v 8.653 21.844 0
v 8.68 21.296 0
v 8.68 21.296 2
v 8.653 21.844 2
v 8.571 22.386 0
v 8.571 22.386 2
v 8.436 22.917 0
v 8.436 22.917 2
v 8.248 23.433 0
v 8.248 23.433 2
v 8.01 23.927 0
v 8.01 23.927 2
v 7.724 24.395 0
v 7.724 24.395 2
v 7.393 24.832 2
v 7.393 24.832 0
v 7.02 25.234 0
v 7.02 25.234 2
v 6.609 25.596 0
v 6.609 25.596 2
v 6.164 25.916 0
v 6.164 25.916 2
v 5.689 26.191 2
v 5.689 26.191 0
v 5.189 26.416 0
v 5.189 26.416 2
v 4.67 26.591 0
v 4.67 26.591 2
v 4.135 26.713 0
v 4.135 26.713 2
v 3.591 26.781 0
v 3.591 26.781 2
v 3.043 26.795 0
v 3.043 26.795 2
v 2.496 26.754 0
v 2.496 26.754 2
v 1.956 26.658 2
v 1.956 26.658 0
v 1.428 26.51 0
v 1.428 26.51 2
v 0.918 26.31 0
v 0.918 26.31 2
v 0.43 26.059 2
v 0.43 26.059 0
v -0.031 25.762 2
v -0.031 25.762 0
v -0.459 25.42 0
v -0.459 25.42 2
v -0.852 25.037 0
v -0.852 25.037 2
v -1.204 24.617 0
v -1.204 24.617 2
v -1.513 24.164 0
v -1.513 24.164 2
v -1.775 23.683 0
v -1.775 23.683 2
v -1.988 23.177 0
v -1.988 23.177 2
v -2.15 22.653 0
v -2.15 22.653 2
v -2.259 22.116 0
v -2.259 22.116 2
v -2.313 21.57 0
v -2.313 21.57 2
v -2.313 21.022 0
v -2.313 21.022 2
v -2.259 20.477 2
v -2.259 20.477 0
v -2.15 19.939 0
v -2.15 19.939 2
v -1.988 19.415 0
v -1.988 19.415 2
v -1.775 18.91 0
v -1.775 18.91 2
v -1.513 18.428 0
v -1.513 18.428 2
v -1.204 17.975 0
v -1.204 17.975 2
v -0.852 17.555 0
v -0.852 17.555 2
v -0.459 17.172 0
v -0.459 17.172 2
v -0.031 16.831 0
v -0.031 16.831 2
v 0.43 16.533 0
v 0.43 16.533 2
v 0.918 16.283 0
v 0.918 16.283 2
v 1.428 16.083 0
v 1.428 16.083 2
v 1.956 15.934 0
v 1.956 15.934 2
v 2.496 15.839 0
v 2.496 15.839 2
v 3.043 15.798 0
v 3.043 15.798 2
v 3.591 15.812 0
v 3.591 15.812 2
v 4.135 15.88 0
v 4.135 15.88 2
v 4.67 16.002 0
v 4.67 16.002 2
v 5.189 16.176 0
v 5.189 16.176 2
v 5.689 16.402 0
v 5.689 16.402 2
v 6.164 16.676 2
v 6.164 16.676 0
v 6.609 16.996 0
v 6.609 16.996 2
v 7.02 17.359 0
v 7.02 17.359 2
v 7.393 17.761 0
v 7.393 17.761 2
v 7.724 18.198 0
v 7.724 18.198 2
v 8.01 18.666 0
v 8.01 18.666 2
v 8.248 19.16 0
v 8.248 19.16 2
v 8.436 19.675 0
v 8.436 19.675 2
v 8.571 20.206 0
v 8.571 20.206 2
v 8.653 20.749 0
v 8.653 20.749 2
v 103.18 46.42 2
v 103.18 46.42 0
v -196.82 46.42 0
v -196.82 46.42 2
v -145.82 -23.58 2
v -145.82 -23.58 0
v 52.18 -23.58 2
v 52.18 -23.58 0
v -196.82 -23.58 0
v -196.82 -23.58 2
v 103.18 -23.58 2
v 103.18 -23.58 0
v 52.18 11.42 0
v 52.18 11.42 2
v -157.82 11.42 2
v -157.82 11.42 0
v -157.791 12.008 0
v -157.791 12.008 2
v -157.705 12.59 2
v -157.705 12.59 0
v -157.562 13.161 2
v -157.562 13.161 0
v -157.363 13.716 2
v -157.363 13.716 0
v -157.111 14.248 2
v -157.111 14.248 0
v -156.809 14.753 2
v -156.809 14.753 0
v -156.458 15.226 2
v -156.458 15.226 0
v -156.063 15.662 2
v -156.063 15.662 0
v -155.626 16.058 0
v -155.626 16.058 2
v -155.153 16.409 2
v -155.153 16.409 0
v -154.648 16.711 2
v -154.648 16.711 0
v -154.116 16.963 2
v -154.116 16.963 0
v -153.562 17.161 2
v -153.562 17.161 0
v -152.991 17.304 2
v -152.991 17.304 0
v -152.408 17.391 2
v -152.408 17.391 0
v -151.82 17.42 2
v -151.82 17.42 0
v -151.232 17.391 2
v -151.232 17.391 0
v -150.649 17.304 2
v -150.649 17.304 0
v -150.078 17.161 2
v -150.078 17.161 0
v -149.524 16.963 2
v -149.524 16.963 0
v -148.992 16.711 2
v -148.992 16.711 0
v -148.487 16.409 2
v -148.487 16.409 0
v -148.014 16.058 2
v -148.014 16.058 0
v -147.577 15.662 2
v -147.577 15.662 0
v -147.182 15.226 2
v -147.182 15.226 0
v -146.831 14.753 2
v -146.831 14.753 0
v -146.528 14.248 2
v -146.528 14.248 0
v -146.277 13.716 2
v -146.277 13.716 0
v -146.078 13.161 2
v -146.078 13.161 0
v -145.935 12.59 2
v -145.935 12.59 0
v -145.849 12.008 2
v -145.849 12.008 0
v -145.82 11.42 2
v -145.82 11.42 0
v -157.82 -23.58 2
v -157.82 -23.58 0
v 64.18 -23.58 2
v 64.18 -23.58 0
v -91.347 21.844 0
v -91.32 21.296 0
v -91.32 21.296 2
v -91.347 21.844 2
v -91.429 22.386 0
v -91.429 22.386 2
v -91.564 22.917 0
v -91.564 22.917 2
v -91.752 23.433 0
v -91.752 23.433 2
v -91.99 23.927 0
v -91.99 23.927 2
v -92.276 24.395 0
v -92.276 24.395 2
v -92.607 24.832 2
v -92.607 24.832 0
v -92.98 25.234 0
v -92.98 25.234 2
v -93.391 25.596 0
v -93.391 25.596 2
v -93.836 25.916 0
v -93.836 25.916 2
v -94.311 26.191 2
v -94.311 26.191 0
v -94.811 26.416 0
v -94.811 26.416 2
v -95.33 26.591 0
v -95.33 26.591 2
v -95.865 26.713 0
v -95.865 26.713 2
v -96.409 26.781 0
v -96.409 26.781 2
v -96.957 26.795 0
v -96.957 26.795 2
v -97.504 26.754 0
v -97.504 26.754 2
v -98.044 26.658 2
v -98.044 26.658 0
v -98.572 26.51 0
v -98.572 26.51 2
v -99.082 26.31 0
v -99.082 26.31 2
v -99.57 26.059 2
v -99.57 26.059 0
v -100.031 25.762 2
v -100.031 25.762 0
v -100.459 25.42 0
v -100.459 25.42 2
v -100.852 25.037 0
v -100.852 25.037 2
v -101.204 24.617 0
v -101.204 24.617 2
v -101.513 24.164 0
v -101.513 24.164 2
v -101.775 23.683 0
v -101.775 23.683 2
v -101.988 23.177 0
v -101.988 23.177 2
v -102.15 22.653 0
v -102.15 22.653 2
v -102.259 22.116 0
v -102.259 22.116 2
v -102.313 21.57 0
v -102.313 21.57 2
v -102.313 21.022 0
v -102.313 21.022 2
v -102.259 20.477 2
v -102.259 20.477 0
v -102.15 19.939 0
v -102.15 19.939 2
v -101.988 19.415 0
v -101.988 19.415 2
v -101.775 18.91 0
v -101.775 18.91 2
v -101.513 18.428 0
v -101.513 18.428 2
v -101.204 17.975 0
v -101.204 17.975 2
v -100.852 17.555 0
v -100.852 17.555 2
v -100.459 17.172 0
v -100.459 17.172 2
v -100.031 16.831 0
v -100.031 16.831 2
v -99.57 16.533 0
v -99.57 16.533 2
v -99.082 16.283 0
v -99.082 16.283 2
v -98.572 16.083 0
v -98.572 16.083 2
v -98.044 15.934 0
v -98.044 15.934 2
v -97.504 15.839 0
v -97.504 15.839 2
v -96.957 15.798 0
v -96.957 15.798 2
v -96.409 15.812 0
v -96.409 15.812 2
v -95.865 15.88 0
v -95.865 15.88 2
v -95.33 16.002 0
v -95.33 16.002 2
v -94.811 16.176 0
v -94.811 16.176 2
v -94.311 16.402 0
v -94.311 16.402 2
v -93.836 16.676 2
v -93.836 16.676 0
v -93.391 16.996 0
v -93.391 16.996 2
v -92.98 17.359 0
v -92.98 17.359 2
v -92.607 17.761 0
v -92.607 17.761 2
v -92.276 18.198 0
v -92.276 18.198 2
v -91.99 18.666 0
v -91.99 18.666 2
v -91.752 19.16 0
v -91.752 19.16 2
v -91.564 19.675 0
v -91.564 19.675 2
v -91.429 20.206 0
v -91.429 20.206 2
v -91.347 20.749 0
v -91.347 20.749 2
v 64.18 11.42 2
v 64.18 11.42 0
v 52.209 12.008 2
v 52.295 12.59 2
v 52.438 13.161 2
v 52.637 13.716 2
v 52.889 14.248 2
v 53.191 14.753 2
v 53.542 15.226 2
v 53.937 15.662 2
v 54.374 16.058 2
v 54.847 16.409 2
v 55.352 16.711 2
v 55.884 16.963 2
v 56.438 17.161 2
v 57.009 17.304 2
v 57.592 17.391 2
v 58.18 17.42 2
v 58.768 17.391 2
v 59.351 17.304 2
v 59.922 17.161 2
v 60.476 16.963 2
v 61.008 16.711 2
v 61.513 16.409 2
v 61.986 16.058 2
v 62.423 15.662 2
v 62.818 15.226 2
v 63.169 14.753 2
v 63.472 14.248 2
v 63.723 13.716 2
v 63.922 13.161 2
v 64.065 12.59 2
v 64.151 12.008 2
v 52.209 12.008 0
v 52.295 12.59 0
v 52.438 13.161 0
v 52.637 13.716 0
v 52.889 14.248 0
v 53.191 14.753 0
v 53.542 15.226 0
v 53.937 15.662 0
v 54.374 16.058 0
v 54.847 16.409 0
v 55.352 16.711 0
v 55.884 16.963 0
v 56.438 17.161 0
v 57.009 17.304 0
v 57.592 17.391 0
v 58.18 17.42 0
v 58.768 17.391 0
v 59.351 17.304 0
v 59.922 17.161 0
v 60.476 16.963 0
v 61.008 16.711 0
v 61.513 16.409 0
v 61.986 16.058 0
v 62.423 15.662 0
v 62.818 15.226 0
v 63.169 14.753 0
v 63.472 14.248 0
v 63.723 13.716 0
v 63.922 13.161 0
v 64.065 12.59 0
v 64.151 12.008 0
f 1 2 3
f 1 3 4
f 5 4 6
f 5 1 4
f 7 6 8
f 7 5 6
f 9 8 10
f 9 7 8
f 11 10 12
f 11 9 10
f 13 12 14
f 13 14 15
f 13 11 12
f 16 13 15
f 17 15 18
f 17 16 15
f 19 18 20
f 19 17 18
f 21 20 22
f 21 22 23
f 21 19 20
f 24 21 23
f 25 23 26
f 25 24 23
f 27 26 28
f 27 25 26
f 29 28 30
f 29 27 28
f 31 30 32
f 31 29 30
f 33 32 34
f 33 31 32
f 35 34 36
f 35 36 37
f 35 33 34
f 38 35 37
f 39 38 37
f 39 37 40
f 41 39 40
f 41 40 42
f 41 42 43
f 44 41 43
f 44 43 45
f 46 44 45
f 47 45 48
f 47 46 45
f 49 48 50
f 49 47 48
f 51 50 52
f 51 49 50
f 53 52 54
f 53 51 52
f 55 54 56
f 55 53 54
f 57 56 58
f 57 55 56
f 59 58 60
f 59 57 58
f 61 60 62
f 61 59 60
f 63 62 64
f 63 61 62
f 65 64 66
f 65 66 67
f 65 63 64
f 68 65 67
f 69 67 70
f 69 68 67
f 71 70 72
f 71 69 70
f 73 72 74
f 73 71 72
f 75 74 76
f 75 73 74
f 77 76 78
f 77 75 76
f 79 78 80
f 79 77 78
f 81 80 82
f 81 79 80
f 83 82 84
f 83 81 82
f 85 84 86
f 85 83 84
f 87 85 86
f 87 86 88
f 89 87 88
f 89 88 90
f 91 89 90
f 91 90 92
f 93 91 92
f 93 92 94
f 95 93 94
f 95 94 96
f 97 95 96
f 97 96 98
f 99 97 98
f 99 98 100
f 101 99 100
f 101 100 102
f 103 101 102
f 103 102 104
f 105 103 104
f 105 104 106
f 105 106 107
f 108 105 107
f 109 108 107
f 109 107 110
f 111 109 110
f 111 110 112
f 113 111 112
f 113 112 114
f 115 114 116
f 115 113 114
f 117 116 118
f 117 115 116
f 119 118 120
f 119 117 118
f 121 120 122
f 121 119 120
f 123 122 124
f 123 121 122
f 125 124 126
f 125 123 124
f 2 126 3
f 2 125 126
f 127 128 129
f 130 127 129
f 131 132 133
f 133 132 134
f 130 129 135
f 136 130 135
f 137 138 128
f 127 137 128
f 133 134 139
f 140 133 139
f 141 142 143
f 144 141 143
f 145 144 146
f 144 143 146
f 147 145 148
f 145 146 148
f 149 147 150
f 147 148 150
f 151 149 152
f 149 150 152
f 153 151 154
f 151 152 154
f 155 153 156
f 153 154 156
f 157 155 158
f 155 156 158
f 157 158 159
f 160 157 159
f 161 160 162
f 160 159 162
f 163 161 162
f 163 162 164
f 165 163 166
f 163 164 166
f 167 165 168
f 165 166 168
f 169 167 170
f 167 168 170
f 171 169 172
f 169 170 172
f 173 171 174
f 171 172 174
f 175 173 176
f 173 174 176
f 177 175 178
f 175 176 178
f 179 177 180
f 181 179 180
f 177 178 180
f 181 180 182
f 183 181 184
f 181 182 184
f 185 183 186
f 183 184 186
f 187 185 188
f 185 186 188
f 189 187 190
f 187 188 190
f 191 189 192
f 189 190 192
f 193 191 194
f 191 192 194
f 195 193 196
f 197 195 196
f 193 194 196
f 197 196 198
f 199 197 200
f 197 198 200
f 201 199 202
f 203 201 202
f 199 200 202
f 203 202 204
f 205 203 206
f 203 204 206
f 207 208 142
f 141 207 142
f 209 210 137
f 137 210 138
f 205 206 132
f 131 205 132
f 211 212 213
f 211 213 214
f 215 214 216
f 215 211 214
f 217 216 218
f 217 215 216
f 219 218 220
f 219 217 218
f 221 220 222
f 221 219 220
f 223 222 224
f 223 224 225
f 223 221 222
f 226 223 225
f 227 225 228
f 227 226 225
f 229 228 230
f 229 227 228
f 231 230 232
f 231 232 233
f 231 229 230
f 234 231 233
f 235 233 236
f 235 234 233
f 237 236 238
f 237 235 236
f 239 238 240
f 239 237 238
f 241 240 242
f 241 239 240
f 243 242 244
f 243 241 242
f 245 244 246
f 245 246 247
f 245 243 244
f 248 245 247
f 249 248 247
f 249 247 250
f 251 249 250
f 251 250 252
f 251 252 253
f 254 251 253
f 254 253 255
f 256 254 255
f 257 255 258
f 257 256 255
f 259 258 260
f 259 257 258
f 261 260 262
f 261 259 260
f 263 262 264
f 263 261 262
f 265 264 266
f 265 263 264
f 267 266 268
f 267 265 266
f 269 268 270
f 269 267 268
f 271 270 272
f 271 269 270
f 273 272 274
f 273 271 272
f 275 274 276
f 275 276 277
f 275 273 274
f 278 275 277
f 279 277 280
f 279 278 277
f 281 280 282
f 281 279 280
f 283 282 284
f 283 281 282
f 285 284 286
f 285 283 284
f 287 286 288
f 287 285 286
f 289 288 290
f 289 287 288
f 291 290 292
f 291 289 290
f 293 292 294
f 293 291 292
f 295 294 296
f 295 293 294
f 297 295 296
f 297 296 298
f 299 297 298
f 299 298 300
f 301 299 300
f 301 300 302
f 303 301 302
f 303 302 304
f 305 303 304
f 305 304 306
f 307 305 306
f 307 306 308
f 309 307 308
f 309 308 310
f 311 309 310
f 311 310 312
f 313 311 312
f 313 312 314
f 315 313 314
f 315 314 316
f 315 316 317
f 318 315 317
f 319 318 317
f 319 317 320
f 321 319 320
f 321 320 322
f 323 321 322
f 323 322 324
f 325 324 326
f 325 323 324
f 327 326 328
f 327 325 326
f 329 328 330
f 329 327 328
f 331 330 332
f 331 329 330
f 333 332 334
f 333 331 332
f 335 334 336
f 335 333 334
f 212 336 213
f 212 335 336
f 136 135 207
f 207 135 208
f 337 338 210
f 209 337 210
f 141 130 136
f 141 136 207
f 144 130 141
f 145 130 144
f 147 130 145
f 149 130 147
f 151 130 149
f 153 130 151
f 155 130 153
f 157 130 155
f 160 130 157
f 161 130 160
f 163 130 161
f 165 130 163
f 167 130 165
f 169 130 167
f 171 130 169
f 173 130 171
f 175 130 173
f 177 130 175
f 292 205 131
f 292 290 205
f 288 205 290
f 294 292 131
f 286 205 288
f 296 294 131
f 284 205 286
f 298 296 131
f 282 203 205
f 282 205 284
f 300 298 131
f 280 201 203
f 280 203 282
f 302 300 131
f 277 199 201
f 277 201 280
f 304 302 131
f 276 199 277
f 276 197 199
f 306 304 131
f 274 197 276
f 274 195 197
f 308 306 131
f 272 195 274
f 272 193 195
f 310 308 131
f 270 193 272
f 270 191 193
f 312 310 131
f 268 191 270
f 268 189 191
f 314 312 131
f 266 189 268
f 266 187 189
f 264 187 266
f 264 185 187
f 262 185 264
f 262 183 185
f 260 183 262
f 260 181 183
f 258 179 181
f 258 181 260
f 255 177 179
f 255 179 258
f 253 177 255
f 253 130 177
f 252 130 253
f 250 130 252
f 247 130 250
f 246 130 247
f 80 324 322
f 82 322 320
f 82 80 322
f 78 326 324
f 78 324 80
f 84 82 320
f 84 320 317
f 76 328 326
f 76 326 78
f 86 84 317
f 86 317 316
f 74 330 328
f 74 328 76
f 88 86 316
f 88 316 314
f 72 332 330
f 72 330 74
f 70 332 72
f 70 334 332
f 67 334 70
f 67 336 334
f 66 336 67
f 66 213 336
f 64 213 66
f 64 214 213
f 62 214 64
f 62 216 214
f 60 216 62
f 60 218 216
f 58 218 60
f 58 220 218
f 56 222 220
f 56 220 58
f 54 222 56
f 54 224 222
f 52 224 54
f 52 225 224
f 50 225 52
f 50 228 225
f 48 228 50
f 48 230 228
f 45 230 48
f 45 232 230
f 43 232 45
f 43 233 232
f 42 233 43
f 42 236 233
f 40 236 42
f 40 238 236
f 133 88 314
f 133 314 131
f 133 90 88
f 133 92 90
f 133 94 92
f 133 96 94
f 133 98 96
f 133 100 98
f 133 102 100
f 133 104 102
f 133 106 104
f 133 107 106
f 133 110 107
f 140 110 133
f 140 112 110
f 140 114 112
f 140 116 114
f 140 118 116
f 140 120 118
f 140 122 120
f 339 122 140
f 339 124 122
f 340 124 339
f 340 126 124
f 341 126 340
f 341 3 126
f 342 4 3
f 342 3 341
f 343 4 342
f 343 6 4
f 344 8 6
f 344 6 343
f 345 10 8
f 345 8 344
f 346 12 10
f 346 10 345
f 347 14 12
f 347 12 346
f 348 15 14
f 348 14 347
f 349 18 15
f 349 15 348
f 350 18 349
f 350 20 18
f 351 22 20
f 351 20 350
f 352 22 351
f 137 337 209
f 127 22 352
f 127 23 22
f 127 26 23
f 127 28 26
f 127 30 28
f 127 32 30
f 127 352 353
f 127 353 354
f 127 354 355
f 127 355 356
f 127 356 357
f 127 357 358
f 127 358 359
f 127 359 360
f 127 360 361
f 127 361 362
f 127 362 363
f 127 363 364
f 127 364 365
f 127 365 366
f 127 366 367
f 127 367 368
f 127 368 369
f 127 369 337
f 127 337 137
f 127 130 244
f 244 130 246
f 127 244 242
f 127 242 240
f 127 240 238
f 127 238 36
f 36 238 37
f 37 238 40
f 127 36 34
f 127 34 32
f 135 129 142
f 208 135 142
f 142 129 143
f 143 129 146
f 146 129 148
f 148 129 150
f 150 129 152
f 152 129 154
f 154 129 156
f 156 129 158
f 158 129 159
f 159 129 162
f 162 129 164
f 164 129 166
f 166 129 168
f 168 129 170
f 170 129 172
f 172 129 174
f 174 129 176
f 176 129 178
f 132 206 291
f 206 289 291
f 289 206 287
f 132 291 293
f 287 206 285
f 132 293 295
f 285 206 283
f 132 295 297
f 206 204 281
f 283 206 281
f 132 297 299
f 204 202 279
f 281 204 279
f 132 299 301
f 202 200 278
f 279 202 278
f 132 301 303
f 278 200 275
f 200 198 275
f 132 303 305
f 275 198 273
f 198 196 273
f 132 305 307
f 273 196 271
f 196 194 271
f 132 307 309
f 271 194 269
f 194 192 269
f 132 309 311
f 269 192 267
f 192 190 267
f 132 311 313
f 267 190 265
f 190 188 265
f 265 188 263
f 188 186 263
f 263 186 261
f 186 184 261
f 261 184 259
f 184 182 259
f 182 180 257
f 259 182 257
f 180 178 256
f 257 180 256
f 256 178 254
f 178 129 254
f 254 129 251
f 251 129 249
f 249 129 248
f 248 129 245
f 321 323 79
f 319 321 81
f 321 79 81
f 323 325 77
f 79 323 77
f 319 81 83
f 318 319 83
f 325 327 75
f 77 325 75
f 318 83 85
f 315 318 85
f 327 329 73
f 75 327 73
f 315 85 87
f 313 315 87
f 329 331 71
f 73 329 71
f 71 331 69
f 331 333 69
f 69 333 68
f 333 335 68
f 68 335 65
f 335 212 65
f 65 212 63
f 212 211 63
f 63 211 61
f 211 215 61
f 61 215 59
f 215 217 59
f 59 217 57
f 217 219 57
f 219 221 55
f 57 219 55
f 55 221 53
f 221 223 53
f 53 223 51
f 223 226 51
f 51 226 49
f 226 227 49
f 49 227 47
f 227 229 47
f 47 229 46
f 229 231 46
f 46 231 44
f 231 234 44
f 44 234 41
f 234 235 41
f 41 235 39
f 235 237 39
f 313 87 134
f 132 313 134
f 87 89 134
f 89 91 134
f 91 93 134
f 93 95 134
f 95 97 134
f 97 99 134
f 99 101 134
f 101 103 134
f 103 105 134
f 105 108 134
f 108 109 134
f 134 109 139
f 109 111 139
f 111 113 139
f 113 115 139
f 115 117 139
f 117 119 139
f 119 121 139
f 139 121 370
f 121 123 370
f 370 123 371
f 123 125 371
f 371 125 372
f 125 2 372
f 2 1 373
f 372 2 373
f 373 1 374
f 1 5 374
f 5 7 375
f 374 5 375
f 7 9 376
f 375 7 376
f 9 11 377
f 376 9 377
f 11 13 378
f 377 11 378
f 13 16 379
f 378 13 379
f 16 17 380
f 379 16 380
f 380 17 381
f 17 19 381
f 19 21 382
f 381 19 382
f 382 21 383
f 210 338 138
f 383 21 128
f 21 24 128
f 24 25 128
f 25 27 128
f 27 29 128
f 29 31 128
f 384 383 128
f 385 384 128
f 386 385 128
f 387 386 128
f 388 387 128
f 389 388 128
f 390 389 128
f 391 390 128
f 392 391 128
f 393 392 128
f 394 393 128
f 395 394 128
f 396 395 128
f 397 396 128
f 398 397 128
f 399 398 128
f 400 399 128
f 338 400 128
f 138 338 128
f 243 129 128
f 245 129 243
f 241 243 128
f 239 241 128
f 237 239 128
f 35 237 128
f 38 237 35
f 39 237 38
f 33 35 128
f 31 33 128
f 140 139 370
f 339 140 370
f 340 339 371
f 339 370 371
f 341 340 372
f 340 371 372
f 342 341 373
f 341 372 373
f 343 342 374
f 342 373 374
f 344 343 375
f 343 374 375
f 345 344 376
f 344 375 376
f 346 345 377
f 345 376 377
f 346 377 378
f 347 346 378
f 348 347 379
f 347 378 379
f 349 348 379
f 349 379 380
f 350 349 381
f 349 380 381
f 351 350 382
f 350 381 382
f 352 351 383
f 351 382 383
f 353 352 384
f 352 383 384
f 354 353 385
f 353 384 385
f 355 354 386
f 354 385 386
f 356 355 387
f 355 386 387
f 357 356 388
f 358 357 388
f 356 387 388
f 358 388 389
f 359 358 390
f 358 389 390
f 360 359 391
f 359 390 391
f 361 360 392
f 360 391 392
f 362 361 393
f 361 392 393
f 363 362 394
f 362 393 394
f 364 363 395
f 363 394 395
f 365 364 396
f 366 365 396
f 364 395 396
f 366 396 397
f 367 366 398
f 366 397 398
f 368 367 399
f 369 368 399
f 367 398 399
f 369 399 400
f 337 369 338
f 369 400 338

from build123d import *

# Parameters (mm, degrees)
SKETCH1_R           = 5.5
BOSS_EXTRUDE1_DEPTH = 2


with BuildPart() as part:
    # Sketch1 → Boss-Extrude1 (new body)
    with BuildSketch(Plane.XY):
        with BuildLine():
            Line((103.180041152, 46.419753086), (-196.819958848, 46.419753086))
            Line((-196.819958848, 46.419753086), (-196.819958848, -23.580246914))
            Line((-196.819958848, -23.580246914), (-157.819958848, -23.580246914))
            Line((-157.819958848, -23.580246914), (-157.819958848, 11.419753086))
            ThreePointArc((-157.819958848, 11.419753086), (-151.819958848, 17.419753086), (-145.819958848, 11.419753086))
            Line((-145.819958848, 11.419753086), (-145.819958848, -23.580246914))
            Line((-145.819958848, -23.580246914), (52.180041152, -23.580246914))
            Line((52.180041152, -23.580246914), (52.180041152, 11.419753086))
            ThreePointArc((52.180041152, 11.419753086), (58.180041152, 17.419753086), (64.180041152, 11.419753086))
            Line((64.180041152, 11.419753086), (64.180041152, -23.580246914))
            Line((64.180041152, -23.580246914), (103.180041152, -23.580246914))
            Line((103.180041152, -23.580246914), (103.180041152, 46.419753086))
        make_face()
        with Locations((-96.819958848, 21.296296296)):
            Circle(SKETCH1_R, mode=Mode.SUBTRACT)
        with Locations((3.180041152, 21.296296296)):
            Circle(SKETCH1_R, mode=Mode.SUBTRACT)
    extrude(amount=BOSS_EXTRUDE1_DEPTH)


solid = part.part
